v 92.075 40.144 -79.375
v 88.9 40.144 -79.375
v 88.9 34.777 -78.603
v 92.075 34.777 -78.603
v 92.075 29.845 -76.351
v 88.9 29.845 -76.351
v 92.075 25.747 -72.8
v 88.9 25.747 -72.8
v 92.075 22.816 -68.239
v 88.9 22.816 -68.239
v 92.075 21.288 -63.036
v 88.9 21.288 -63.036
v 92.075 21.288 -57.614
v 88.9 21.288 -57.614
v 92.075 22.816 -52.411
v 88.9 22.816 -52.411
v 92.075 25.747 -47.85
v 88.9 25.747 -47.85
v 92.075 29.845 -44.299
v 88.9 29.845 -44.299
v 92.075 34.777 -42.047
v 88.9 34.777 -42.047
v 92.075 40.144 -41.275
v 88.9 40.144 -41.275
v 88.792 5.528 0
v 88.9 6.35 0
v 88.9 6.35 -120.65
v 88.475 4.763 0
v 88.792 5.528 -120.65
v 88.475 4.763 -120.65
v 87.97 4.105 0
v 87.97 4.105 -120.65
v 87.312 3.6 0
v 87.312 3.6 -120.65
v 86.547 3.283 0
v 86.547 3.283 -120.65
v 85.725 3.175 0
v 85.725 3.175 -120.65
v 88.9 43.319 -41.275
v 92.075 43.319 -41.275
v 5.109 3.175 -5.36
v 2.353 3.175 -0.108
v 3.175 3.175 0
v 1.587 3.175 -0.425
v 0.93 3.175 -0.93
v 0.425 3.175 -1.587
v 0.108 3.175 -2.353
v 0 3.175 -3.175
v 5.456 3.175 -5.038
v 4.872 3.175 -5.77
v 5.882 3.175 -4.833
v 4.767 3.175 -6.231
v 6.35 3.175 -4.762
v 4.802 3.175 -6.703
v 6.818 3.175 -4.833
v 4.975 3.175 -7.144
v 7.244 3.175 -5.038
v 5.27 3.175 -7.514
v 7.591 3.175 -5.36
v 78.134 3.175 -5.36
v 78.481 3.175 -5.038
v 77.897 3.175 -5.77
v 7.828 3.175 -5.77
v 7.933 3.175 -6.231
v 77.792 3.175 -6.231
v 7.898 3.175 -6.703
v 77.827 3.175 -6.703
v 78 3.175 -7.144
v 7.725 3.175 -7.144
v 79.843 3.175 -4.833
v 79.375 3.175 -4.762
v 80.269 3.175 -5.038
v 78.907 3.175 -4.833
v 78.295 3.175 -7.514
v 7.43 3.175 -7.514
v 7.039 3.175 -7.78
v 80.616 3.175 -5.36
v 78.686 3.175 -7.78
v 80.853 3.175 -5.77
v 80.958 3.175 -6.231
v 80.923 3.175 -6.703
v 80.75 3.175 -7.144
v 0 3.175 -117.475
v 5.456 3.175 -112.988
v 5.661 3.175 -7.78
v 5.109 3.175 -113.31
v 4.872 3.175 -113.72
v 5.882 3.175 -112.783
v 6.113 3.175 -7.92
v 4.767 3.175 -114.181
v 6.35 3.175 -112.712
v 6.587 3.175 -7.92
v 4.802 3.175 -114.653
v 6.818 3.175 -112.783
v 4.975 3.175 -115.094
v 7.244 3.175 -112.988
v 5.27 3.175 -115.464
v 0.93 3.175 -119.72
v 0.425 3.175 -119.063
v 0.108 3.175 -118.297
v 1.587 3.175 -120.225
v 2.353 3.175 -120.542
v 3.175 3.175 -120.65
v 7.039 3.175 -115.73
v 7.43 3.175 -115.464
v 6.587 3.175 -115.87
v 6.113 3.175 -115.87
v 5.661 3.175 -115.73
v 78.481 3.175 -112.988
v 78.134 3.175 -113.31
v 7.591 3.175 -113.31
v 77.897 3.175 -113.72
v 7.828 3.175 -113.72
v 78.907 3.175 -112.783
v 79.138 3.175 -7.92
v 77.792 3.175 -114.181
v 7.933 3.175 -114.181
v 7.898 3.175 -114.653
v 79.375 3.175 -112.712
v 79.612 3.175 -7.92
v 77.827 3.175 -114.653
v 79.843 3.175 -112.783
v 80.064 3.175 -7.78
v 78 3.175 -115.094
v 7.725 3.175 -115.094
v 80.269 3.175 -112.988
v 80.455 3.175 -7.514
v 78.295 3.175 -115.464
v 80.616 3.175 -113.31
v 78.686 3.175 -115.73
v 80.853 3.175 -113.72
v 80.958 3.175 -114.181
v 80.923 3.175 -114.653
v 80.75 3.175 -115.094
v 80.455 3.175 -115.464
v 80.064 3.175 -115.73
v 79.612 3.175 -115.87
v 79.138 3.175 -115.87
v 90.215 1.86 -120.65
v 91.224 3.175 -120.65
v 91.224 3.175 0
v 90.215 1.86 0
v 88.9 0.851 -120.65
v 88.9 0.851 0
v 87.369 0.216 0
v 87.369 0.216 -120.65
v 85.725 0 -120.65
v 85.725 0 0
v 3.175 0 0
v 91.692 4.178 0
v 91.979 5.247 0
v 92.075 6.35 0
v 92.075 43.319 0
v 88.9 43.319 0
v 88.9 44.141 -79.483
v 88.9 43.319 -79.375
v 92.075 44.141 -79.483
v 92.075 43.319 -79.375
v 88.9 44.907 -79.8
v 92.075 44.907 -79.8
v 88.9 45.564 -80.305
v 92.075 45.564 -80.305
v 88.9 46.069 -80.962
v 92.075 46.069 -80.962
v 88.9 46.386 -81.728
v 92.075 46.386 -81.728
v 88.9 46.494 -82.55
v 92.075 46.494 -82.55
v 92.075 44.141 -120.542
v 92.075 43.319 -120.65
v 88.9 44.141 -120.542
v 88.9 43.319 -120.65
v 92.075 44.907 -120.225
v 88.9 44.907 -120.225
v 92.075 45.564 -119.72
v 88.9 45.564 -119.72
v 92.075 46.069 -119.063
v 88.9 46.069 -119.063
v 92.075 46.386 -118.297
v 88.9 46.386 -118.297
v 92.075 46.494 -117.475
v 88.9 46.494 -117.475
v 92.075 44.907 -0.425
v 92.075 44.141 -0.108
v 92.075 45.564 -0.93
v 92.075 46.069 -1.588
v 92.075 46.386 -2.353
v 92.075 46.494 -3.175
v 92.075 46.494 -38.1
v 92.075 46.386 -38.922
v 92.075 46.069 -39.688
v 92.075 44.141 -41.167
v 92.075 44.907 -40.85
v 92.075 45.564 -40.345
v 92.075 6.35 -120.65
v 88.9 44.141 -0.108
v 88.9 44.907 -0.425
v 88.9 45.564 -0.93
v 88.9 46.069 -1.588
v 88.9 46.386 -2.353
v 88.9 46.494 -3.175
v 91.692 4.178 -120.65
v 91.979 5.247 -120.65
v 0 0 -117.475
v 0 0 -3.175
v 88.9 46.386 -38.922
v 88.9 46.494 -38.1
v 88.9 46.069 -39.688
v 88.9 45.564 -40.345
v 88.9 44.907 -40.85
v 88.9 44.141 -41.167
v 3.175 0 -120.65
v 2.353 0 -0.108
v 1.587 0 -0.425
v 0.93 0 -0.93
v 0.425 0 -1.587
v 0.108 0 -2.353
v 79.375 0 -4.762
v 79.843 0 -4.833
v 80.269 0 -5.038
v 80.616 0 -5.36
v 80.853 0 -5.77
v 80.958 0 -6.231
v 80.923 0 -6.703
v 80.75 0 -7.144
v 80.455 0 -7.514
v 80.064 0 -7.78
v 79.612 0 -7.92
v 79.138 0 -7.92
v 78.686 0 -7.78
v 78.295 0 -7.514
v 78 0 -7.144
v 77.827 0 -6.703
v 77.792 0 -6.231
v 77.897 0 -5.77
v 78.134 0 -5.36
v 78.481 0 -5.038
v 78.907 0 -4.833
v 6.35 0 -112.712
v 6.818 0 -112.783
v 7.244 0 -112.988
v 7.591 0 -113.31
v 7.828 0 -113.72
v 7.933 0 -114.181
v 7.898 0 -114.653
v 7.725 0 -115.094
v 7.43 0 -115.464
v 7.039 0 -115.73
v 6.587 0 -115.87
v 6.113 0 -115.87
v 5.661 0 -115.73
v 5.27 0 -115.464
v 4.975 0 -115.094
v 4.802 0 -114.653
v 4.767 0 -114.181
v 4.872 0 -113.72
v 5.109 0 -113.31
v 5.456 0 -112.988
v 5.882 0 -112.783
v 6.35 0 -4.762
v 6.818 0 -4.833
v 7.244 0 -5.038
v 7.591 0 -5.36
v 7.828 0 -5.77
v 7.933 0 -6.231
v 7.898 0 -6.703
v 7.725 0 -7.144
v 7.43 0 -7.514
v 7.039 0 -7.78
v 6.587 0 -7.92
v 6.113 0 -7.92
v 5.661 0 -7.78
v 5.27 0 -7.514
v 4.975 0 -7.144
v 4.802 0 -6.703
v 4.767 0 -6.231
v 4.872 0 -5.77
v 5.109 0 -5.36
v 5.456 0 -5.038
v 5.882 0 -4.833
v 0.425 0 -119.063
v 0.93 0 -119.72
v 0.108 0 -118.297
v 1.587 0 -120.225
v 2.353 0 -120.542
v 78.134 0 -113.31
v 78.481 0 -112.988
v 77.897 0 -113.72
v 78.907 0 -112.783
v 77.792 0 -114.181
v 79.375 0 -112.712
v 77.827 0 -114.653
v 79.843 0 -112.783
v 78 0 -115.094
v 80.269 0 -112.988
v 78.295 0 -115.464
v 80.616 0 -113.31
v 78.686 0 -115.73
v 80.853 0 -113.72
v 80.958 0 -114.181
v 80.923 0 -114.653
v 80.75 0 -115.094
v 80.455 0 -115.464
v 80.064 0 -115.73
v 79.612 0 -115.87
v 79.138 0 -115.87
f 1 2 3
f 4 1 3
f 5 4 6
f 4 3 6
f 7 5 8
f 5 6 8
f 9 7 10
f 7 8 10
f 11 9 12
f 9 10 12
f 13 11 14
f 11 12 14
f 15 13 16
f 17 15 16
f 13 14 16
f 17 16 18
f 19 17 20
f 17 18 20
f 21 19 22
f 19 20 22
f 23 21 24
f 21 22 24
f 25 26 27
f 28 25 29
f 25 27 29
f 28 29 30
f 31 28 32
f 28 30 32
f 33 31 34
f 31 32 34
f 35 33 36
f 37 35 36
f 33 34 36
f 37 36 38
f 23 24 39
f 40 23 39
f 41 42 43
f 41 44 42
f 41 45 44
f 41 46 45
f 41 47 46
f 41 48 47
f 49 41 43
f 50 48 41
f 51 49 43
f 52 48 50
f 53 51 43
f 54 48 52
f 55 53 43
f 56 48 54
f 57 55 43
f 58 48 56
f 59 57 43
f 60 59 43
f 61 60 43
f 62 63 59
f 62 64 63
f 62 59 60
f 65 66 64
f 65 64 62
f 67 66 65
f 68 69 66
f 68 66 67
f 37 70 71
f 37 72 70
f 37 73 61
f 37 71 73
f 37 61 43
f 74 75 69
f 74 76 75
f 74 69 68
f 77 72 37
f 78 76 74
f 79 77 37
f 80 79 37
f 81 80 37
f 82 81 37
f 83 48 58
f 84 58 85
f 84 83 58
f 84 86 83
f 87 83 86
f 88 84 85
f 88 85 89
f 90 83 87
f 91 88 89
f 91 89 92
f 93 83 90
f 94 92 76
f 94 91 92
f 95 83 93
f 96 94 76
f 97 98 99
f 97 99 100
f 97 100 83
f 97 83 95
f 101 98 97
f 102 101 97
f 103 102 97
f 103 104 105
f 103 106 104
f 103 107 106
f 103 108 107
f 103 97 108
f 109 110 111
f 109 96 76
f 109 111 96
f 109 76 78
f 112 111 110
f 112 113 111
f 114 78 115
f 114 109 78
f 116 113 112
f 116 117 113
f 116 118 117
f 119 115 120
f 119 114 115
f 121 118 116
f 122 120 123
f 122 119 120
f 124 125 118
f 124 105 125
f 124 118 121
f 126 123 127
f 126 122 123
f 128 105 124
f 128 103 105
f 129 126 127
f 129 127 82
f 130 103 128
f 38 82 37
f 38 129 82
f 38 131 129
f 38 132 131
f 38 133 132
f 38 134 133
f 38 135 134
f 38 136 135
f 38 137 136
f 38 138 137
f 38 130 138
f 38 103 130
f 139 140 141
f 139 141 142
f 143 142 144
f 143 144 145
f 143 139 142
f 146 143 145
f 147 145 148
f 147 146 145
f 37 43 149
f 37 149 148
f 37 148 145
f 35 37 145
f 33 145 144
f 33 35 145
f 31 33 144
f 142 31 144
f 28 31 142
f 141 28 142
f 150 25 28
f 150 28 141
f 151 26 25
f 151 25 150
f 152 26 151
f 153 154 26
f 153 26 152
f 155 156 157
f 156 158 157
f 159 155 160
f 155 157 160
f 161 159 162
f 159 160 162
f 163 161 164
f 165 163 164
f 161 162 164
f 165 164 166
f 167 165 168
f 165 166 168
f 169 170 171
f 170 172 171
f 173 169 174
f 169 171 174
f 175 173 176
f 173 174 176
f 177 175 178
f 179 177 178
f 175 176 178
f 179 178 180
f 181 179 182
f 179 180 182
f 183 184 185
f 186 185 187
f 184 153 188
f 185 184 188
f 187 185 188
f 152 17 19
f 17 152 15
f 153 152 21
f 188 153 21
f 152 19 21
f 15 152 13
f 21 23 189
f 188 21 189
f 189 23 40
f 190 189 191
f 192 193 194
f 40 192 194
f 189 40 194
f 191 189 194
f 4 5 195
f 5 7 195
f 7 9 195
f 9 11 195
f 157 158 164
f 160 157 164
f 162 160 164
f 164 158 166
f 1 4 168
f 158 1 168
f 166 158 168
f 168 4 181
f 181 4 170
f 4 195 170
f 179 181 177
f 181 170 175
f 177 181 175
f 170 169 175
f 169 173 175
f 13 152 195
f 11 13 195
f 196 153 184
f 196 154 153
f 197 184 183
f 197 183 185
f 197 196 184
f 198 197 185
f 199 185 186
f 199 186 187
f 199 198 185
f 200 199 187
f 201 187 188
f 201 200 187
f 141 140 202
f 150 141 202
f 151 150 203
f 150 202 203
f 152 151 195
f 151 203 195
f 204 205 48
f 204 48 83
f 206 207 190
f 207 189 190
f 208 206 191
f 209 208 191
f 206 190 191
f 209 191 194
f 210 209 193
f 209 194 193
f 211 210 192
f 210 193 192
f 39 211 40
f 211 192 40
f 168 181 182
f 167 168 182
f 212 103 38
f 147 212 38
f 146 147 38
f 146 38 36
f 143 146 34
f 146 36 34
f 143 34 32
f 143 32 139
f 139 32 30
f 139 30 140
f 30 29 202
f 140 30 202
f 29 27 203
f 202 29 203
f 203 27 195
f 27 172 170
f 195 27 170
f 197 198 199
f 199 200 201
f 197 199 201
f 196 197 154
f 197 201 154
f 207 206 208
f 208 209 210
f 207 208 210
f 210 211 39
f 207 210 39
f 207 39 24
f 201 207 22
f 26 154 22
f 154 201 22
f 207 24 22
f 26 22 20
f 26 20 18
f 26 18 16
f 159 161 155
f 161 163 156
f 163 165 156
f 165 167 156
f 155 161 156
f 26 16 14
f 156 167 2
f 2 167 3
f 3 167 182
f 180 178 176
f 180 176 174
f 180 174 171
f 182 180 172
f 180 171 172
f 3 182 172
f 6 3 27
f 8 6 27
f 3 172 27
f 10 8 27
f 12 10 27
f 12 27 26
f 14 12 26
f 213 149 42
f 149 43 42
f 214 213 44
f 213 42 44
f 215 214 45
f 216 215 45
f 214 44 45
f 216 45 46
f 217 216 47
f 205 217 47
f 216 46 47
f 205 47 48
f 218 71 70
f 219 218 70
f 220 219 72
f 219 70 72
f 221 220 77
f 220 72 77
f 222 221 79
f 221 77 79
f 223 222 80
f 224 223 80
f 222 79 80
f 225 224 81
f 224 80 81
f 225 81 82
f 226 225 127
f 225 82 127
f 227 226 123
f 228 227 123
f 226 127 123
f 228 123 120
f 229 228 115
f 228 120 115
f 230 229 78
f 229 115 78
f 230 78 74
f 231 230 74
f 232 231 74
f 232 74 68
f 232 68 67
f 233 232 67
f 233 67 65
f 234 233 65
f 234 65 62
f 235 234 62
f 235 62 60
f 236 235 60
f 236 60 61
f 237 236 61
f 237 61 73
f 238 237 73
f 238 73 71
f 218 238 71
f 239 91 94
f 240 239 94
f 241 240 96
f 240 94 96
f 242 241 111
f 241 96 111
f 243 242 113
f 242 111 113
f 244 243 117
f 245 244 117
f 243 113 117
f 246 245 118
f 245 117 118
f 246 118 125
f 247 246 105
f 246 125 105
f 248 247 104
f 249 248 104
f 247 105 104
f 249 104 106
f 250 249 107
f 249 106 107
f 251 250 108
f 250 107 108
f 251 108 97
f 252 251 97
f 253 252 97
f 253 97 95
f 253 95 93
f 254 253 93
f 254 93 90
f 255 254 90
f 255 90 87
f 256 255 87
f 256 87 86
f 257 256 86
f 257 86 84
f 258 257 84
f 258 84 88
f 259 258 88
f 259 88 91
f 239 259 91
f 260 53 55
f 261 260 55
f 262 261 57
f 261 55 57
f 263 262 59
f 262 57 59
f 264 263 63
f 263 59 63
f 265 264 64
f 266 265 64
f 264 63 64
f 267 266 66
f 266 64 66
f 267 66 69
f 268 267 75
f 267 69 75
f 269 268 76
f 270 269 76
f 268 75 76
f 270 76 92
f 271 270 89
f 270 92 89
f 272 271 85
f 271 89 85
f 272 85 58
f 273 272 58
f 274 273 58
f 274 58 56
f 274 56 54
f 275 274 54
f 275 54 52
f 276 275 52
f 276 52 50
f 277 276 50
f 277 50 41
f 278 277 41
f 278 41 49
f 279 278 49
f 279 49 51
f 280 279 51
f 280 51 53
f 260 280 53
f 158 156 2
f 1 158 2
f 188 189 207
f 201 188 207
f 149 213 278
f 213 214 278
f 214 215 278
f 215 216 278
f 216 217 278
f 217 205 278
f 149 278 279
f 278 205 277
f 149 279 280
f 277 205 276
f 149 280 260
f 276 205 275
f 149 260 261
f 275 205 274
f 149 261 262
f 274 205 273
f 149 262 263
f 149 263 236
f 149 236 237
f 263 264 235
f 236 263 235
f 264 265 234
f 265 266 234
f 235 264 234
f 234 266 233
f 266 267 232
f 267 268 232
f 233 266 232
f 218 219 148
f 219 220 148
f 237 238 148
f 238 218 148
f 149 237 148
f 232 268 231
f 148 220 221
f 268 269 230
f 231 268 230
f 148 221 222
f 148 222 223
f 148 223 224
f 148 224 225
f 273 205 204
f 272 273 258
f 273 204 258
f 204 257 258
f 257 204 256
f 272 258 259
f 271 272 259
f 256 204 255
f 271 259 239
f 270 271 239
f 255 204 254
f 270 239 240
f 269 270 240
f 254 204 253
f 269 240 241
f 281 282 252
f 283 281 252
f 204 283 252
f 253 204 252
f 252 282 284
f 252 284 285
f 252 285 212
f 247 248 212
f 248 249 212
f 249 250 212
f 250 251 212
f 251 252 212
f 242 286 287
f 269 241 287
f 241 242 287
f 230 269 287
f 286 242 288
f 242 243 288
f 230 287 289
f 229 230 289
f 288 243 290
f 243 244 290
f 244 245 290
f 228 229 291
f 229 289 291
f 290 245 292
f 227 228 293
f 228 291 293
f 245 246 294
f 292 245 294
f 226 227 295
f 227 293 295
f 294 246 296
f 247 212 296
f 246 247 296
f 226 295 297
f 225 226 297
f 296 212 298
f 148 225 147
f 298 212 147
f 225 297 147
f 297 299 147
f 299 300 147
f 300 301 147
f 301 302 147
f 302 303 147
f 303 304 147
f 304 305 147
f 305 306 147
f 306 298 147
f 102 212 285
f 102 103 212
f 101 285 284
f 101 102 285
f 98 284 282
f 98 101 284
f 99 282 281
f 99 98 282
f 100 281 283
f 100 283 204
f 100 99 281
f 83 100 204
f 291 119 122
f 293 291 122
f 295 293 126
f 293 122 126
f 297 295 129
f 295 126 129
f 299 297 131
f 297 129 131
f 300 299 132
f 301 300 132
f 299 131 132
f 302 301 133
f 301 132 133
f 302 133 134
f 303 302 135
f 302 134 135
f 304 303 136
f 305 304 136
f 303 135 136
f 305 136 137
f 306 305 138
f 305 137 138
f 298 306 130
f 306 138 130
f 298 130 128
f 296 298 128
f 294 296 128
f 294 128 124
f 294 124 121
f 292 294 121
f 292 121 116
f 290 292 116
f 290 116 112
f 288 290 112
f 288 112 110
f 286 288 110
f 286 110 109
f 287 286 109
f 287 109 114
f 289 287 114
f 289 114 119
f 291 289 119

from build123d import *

# Parameters (mm, degrees)
SKETCH1_W              = 133.35
SKETCH1_H              = 120.65
BOSS_EXTRUDE1_DEPTH    = 3.175
SKETCHED_START         = -120.65
SKETCHED_BEND1_DEPTH   = 120.65
SKETCHED_BEND1_2_DEPTH = 120.65
CUT_EXTRUDE1_DEPTH     = 157.911861269
SKETCH9_R              = 1.5875
CUT_EXTRUDE2_DEPTH     = 158.831464015
FILLET1_R              = 3.175


# Read off the part's stored shape, not the designer's step: Sketched Bend1
with BuildPart() as part:
    # Sketch1 → Boss-Extrude1 (new body)
    with BuildSketch(Plane(origin=(0, 0, 0), x_dir=(1, 0, 0), z_dir=(0, 1, 0))):
        with Locations((66.675, 60.325)):
            Rectangle(SKETCH1_W, SKETCH1_H)
    extrude(amount=BOSS_EXTRUDE1_DEPTH)

    # Sketched Bend1 outline → Sketched Bend1 (cut)
    with BuildSketch(Plane.XY.offset(SKETCHED_START)):
        with BuildLine():
            Line((133.35, 3.175), (91.224261315, 3.175))
            ThreePointArc((91.224261315, 3.175), (88.900000001, 0.850738686), (85.725, 0))
            Line((85.725, 0), (133.35, 0))
            Line((133.35, 0), (133.35, 3.175))
        make_face()
    extrude(amount=SKETCHED_BEND1_DEPTH, mode=Mode.SUBTRACT)

    # Sketched Bend1 2 outline → Sketched Bend1 2 (add)
    with BuildSketch(Plane.XY.offset(SKETCHED_START)):
        with BuildLine():
            Line((88.9, 46.494082494), (88.9, 6.35))
            ThreePointArc((88.9, 6.35), (87.97006403, 4.10493597), (85.725, 3.175))
            Line((85.725, 3.175), (91.224261315, 3.175))
            ThreePointArc((91.224261315, 3.175), (91.858628997, 4.706499064), (92.075, 6.35))
            Line((92.075, 6.35), (92.075, 46.494082494))
            Line((92.075, 46.494082494), (88.9, 46.494082494))
        make_face()
    extrude(amount=SKETCHED_BEND1_2_DEPTH)

    # Sketch7 → Cut-Extrude1 (cut, through all)
    with BuildSketch(Plane.ZY.offset(-88.9)):
        with BuildLine():
            Line((-79.375, 46.494082494), (-79.375, 40.144082494))
            ThreePointArc((-79.375, 40.144082494), (-60.325, 21.094082494), (-41.275, 40.144082494))
            Line((-41.275, 40.144082494), (-41.275, 46.494082494))
            Line((-41.275, 46.494082494), (-79.375, 46.494082494))
        make_face()
    extrude(amount=-CUT_EXTRUDE1_DEPTH, mode=Mode.SUBTRACT)

    # Sketch9 → Cut-Extrude2 (cut, through all)
    with BuildSketch(Plane(origin=(0, 3.175, 0), x_dir=(1, 0, 0), z_dir=(0, 1, 0))):
        with Locations(Location((6.35, 114.3, 0), (0, 0, 270))):
            Circle(SKETCH9_R)
        with Locations(Location((79.375, 114.3, 0), (0, 0, 270))):
            Circle(SKETCH9_R)
        with Locations(Location((6.35, 6.35, 0), (0, 0, 270))):
            Circle(SKETCH9_R)
        with Locations(Location((79.375, 6.35, 0), (0, 0, 270))):
            Circle(SKETCH9_R)
    extrude(amount=-CUT_EXTRUDE2_DEPTH, mode=Mode.SUBTRACT)

    # Fillet1
    fillet1_edges = [part.edges().sort_by_distance(p)[0] for p in [
        (0, 1.5875, 0),
        (0, 1.5875, -120.65),
        (90.4875, 46.494082494, -79.375),
        (90.4875, 46.494082494, -41.275),
        (90.4875, 46.494082494, -120.65),
        (90.4875, 46.494082494, 0),
    ]]
    fillet(fillet1_edges, radius=FILLET1_R)


solid = part.part
